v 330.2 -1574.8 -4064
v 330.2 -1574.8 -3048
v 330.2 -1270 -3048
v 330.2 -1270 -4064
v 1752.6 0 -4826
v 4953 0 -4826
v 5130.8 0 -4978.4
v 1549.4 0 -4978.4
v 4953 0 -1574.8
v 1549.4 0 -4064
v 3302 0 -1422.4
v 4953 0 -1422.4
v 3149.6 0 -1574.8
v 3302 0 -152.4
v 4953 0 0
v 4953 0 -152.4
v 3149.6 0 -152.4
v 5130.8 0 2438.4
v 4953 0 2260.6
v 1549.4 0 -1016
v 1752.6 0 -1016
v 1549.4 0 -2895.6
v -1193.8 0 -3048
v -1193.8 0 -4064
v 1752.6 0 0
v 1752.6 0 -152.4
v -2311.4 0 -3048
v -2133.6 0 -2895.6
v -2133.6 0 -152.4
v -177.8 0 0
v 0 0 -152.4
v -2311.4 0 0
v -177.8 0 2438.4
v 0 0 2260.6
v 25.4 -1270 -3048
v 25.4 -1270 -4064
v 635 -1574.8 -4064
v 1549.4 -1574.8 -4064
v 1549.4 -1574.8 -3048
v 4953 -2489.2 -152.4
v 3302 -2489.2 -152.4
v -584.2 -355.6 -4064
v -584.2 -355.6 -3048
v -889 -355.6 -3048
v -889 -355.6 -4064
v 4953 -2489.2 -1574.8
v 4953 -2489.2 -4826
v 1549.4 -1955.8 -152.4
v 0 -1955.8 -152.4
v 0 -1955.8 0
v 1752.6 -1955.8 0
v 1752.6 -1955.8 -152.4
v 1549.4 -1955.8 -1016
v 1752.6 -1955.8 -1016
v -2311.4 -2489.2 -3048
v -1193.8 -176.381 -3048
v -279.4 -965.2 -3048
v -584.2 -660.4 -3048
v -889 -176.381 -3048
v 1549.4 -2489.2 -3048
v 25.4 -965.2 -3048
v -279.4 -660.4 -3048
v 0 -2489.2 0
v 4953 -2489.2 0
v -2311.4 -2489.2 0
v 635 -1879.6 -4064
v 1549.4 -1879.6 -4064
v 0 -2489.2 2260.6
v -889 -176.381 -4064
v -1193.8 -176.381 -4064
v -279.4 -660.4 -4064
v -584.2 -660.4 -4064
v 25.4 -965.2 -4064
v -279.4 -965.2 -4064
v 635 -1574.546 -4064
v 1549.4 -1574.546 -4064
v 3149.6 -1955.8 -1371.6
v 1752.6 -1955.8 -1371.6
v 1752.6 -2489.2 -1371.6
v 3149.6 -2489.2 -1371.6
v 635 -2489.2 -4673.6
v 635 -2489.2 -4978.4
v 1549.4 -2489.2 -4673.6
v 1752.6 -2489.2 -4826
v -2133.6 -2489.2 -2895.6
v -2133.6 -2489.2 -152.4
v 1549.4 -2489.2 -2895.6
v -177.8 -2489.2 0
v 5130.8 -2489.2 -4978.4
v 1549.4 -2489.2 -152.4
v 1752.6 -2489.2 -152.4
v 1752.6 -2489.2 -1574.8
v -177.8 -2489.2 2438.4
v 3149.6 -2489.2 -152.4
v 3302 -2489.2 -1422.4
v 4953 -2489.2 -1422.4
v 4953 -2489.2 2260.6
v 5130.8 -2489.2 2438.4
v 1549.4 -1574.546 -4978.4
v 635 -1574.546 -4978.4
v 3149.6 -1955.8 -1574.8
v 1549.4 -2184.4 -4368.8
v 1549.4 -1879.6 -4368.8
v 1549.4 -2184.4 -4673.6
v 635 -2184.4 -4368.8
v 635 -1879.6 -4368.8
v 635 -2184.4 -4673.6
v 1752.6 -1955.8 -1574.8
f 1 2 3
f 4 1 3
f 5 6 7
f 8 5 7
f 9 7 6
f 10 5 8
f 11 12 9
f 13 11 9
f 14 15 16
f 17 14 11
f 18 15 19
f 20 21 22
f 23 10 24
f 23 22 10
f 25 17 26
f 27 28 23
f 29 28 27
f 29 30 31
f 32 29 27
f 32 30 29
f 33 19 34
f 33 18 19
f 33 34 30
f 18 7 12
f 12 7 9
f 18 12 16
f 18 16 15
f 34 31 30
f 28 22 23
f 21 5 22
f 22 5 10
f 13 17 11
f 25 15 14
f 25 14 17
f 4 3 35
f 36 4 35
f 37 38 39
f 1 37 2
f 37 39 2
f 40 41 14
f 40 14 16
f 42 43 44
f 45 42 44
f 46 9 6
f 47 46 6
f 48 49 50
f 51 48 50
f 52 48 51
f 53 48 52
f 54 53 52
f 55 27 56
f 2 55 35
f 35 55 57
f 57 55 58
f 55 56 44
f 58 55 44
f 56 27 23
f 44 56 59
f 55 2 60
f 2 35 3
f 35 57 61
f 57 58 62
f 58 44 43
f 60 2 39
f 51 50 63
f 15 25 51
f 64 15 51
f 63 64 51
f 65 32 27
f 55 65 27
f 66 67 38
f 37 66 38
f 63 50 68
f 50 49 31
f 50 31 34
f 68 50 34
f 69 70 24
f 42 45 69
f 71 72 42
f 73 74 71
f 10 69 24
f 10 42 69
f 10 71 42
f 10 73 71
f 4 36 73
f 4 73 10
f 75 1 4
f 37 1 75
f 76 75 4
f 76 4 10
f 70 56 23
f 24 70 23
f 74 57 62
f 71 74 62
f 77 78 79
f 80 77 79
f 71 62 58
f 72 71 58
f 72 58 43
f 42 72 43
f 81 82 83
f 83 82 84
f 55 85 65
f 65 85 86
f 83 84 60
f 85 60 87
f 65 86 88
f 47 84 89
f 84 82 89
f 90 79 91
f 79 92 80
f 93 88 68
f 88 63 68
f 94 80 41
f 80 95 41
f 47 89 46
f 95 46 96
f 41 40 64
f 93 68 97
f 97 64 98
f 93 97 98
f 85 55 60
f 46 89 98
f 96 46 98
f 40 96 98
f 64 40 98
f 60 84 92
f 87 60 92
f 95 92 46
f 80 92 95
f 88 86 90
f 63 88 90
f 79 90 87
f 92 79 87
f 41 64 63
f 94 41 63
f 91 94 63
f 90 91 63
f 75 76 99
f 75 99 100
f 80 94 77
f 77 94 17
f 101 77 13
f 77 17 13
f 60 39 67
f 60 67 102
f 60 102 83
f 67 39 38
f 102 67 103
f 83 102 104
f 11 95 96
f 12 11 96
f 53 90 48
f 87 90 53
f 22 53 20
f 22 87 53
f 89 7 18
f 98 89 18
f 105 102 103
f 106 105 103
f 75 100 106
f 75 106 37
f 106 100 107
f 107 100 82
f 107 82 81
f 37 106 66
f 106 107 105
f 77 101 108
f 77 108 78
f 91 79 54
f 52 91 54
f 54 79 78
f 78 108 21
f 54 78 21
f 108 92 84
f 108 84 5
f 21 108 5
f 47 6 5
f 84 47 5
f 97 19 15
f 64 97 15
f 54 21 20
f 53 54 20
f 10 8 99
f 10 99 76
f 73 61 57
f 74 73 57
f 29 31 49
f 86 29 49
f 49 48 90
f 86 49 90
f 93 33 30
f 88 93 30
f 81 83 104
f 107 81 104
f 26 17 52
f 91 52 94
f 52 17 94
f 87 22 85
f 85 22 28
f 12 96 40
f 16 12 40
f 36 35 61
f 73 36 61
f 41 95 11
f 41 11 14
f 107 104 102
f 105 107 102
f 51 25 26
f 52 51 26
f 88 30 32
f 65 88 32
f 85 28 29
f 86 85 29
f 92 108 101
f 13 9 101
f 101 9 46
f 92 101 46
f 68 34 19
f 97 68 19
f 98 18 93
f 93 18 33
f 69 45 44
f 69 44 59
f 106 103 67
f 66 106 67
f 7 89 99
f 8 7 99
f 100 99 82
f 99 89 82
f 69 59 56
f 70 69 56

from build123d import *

# Parameters (mm, degrees)
F0_W       = 1651
F0_H       = 1270
F1_DEPTH   = 2489.2
F2_W       = 533.4
F2_H       = 152.4
F3_DEPTH   = 1752.6
F4_W       = 203.2
F4_H       = 533.4
F5_DEPTH   = 863.6
F6_W       = 533.4
F6_H       = 203.2
F7_DEPTH   = 1397
F9_DEPTH   = 914.4
F9_FACE_W  = 914.4
F9_FACE_H  = 304.8
F10_DEPTH  = 711.2
F10_FACE_W = 914.4
F10_FACE_H = 1930.4
F11_DEPTH  = 1270
F13_DEPTH  = 1016
F14_W      = 914.4
F14_H      = 914.4
F15_DEPTH  = 1574.546


with BuildPart() as f1:
    # F0 (on Front) → F1 (new body)
    with BuildSketch(Plane.XZ):
        Polygon((5130.8, -4978.4), (5130.8, 2438.4), (-177.8, 2438.4), (-177.8, 0), (-2311.4, 0), (-2311.4, -3048), (1549.4, -3048), (1549.4, -4978.4), align=None)
        Polygon((4953, 2260.6), (4953, 0), (1752.6, 0), (1752.6, -152.4), (3149.6, -152.4), (3149.6, -1574.8), (4953, -1574.8), (4953, -4826), (1752.6, -4826), (1752.6, -1016), (1549.4, -1016), (1549.4, -2895.6), (-2133.6, -2895.6), (-2133.6, -152.4), (0, -152.4), (0, 0), (0, 2260.6), align=None, mode=Mode.SUBTRACT)
        with Locations((4127.5, -787.4)):
            Rectangle(F0_W, F0_H, mode=Mode.SUBTRACT)
    extrude(amount=F1_DEPTH)

    # F2 (on face) → F3 (join, through all)
    with BuildSketch(Plane(origin=(1752.6, 0, 0), x_dir=(0, -1, 0), z_dir=(-1, 0, 0))):
        with Locations((2222.5, -76.2)):
            Rectangle(F2_W, F2_H)
    extrude(amount=F3_DEPTH)

    # F4 (on face) → F5 (join, through all)
    with BuildSketch(Plane.XY.offset(-1016)):
        with Locations((1651, -2222.5)):
            Rectangle(F4_W, F4_H)
    extrude(amount=F5_DEPTH)

    # F6 (on face) → F7 (join, through all)
    with BuildSketch(Plane(origin=(3149.6, 0, 0), x_dir=(0, -1, 0), z_dir=(-1, 0, 0))):
        with Locations((2222.5, -1473.2)):
            Rectangle(F6_W, F6_H)
    extrude(amount=F7_DEPTH)

    # F8 (on face) → F9 (join)
    with BuildSketch(Plane(origin=(1549.4, 0, 0), x_dir=(0, -1, 0), z_dir=(-1, 0, 0))):
        Polygon((1270, -4978.4), (2489.2, -4978.4), (2489.2, -4673.6), (2184.4, -4673.6), (2184.4, -4368.8), (1879.6, -4368.8), (1879.6, -4064), (1574.8, -4064), (1574.8, -3759.2), (1270, -3759.2), align=None)
    extrude(amount=F9_DEPTH)

    # F9_face (on face) → F10 (join, through all)
    with BuildSketch(Plane(origin=(1092.2, -1422.4, -3759.2), x_dir=(1, 0, 0), z_dir=(0, 0, 1))):
        Rectangle(F9_FACE_W, F9_FACE_H)
    extrude(amount=F10_DEPTH)

    # F10_face (on face) → F11 (join, through all)
    with BuildSketch(Plane(origin=(1092.2, -1270, -4013.2), x_dir=(-1, 0, 0), z_dir=(0, 1, 0))):
        Rectangle(F10_FACE_W, F10_FACE_H)
    extrude(amount=F11_DEPTH)

    # F12 (on face) → F13 (join, through all)
    with BuildSketch(Plane(origin=(0, 0, -3048), x_dir=(1, 0, 0), z_dir=(0, 0, -1))):
        Polygon((635, 0), (635, 1574.8), (330.2, 1574.8), (330.2, 1270), (25.4, 1270), (25.4, 965.2), (-279.4, 965.2), (-279.4, 660.4), (-584.2, 660.4), (-584.2, 355.6), (-889, 355.6), (-889, 176.380713), (-1193.8, 176.380713), (-1193.8, 0), align=None)
    extrude(amount=F13_DEPTH)

    # F14 (on face) → F15 (cut)
    with BuildSketch(Plane(origin=(0, 0, 0), x_dir=(-1, 0, 0), z_dir=(0, 1, 0))):
        with Locations((-1092.2, -4521.2)):
            Rectangle(F14_W, F14_H)
    extrude(amount=-F15_DEPTH, mode=Mode.SUBTRACT)


solid = f1.part
